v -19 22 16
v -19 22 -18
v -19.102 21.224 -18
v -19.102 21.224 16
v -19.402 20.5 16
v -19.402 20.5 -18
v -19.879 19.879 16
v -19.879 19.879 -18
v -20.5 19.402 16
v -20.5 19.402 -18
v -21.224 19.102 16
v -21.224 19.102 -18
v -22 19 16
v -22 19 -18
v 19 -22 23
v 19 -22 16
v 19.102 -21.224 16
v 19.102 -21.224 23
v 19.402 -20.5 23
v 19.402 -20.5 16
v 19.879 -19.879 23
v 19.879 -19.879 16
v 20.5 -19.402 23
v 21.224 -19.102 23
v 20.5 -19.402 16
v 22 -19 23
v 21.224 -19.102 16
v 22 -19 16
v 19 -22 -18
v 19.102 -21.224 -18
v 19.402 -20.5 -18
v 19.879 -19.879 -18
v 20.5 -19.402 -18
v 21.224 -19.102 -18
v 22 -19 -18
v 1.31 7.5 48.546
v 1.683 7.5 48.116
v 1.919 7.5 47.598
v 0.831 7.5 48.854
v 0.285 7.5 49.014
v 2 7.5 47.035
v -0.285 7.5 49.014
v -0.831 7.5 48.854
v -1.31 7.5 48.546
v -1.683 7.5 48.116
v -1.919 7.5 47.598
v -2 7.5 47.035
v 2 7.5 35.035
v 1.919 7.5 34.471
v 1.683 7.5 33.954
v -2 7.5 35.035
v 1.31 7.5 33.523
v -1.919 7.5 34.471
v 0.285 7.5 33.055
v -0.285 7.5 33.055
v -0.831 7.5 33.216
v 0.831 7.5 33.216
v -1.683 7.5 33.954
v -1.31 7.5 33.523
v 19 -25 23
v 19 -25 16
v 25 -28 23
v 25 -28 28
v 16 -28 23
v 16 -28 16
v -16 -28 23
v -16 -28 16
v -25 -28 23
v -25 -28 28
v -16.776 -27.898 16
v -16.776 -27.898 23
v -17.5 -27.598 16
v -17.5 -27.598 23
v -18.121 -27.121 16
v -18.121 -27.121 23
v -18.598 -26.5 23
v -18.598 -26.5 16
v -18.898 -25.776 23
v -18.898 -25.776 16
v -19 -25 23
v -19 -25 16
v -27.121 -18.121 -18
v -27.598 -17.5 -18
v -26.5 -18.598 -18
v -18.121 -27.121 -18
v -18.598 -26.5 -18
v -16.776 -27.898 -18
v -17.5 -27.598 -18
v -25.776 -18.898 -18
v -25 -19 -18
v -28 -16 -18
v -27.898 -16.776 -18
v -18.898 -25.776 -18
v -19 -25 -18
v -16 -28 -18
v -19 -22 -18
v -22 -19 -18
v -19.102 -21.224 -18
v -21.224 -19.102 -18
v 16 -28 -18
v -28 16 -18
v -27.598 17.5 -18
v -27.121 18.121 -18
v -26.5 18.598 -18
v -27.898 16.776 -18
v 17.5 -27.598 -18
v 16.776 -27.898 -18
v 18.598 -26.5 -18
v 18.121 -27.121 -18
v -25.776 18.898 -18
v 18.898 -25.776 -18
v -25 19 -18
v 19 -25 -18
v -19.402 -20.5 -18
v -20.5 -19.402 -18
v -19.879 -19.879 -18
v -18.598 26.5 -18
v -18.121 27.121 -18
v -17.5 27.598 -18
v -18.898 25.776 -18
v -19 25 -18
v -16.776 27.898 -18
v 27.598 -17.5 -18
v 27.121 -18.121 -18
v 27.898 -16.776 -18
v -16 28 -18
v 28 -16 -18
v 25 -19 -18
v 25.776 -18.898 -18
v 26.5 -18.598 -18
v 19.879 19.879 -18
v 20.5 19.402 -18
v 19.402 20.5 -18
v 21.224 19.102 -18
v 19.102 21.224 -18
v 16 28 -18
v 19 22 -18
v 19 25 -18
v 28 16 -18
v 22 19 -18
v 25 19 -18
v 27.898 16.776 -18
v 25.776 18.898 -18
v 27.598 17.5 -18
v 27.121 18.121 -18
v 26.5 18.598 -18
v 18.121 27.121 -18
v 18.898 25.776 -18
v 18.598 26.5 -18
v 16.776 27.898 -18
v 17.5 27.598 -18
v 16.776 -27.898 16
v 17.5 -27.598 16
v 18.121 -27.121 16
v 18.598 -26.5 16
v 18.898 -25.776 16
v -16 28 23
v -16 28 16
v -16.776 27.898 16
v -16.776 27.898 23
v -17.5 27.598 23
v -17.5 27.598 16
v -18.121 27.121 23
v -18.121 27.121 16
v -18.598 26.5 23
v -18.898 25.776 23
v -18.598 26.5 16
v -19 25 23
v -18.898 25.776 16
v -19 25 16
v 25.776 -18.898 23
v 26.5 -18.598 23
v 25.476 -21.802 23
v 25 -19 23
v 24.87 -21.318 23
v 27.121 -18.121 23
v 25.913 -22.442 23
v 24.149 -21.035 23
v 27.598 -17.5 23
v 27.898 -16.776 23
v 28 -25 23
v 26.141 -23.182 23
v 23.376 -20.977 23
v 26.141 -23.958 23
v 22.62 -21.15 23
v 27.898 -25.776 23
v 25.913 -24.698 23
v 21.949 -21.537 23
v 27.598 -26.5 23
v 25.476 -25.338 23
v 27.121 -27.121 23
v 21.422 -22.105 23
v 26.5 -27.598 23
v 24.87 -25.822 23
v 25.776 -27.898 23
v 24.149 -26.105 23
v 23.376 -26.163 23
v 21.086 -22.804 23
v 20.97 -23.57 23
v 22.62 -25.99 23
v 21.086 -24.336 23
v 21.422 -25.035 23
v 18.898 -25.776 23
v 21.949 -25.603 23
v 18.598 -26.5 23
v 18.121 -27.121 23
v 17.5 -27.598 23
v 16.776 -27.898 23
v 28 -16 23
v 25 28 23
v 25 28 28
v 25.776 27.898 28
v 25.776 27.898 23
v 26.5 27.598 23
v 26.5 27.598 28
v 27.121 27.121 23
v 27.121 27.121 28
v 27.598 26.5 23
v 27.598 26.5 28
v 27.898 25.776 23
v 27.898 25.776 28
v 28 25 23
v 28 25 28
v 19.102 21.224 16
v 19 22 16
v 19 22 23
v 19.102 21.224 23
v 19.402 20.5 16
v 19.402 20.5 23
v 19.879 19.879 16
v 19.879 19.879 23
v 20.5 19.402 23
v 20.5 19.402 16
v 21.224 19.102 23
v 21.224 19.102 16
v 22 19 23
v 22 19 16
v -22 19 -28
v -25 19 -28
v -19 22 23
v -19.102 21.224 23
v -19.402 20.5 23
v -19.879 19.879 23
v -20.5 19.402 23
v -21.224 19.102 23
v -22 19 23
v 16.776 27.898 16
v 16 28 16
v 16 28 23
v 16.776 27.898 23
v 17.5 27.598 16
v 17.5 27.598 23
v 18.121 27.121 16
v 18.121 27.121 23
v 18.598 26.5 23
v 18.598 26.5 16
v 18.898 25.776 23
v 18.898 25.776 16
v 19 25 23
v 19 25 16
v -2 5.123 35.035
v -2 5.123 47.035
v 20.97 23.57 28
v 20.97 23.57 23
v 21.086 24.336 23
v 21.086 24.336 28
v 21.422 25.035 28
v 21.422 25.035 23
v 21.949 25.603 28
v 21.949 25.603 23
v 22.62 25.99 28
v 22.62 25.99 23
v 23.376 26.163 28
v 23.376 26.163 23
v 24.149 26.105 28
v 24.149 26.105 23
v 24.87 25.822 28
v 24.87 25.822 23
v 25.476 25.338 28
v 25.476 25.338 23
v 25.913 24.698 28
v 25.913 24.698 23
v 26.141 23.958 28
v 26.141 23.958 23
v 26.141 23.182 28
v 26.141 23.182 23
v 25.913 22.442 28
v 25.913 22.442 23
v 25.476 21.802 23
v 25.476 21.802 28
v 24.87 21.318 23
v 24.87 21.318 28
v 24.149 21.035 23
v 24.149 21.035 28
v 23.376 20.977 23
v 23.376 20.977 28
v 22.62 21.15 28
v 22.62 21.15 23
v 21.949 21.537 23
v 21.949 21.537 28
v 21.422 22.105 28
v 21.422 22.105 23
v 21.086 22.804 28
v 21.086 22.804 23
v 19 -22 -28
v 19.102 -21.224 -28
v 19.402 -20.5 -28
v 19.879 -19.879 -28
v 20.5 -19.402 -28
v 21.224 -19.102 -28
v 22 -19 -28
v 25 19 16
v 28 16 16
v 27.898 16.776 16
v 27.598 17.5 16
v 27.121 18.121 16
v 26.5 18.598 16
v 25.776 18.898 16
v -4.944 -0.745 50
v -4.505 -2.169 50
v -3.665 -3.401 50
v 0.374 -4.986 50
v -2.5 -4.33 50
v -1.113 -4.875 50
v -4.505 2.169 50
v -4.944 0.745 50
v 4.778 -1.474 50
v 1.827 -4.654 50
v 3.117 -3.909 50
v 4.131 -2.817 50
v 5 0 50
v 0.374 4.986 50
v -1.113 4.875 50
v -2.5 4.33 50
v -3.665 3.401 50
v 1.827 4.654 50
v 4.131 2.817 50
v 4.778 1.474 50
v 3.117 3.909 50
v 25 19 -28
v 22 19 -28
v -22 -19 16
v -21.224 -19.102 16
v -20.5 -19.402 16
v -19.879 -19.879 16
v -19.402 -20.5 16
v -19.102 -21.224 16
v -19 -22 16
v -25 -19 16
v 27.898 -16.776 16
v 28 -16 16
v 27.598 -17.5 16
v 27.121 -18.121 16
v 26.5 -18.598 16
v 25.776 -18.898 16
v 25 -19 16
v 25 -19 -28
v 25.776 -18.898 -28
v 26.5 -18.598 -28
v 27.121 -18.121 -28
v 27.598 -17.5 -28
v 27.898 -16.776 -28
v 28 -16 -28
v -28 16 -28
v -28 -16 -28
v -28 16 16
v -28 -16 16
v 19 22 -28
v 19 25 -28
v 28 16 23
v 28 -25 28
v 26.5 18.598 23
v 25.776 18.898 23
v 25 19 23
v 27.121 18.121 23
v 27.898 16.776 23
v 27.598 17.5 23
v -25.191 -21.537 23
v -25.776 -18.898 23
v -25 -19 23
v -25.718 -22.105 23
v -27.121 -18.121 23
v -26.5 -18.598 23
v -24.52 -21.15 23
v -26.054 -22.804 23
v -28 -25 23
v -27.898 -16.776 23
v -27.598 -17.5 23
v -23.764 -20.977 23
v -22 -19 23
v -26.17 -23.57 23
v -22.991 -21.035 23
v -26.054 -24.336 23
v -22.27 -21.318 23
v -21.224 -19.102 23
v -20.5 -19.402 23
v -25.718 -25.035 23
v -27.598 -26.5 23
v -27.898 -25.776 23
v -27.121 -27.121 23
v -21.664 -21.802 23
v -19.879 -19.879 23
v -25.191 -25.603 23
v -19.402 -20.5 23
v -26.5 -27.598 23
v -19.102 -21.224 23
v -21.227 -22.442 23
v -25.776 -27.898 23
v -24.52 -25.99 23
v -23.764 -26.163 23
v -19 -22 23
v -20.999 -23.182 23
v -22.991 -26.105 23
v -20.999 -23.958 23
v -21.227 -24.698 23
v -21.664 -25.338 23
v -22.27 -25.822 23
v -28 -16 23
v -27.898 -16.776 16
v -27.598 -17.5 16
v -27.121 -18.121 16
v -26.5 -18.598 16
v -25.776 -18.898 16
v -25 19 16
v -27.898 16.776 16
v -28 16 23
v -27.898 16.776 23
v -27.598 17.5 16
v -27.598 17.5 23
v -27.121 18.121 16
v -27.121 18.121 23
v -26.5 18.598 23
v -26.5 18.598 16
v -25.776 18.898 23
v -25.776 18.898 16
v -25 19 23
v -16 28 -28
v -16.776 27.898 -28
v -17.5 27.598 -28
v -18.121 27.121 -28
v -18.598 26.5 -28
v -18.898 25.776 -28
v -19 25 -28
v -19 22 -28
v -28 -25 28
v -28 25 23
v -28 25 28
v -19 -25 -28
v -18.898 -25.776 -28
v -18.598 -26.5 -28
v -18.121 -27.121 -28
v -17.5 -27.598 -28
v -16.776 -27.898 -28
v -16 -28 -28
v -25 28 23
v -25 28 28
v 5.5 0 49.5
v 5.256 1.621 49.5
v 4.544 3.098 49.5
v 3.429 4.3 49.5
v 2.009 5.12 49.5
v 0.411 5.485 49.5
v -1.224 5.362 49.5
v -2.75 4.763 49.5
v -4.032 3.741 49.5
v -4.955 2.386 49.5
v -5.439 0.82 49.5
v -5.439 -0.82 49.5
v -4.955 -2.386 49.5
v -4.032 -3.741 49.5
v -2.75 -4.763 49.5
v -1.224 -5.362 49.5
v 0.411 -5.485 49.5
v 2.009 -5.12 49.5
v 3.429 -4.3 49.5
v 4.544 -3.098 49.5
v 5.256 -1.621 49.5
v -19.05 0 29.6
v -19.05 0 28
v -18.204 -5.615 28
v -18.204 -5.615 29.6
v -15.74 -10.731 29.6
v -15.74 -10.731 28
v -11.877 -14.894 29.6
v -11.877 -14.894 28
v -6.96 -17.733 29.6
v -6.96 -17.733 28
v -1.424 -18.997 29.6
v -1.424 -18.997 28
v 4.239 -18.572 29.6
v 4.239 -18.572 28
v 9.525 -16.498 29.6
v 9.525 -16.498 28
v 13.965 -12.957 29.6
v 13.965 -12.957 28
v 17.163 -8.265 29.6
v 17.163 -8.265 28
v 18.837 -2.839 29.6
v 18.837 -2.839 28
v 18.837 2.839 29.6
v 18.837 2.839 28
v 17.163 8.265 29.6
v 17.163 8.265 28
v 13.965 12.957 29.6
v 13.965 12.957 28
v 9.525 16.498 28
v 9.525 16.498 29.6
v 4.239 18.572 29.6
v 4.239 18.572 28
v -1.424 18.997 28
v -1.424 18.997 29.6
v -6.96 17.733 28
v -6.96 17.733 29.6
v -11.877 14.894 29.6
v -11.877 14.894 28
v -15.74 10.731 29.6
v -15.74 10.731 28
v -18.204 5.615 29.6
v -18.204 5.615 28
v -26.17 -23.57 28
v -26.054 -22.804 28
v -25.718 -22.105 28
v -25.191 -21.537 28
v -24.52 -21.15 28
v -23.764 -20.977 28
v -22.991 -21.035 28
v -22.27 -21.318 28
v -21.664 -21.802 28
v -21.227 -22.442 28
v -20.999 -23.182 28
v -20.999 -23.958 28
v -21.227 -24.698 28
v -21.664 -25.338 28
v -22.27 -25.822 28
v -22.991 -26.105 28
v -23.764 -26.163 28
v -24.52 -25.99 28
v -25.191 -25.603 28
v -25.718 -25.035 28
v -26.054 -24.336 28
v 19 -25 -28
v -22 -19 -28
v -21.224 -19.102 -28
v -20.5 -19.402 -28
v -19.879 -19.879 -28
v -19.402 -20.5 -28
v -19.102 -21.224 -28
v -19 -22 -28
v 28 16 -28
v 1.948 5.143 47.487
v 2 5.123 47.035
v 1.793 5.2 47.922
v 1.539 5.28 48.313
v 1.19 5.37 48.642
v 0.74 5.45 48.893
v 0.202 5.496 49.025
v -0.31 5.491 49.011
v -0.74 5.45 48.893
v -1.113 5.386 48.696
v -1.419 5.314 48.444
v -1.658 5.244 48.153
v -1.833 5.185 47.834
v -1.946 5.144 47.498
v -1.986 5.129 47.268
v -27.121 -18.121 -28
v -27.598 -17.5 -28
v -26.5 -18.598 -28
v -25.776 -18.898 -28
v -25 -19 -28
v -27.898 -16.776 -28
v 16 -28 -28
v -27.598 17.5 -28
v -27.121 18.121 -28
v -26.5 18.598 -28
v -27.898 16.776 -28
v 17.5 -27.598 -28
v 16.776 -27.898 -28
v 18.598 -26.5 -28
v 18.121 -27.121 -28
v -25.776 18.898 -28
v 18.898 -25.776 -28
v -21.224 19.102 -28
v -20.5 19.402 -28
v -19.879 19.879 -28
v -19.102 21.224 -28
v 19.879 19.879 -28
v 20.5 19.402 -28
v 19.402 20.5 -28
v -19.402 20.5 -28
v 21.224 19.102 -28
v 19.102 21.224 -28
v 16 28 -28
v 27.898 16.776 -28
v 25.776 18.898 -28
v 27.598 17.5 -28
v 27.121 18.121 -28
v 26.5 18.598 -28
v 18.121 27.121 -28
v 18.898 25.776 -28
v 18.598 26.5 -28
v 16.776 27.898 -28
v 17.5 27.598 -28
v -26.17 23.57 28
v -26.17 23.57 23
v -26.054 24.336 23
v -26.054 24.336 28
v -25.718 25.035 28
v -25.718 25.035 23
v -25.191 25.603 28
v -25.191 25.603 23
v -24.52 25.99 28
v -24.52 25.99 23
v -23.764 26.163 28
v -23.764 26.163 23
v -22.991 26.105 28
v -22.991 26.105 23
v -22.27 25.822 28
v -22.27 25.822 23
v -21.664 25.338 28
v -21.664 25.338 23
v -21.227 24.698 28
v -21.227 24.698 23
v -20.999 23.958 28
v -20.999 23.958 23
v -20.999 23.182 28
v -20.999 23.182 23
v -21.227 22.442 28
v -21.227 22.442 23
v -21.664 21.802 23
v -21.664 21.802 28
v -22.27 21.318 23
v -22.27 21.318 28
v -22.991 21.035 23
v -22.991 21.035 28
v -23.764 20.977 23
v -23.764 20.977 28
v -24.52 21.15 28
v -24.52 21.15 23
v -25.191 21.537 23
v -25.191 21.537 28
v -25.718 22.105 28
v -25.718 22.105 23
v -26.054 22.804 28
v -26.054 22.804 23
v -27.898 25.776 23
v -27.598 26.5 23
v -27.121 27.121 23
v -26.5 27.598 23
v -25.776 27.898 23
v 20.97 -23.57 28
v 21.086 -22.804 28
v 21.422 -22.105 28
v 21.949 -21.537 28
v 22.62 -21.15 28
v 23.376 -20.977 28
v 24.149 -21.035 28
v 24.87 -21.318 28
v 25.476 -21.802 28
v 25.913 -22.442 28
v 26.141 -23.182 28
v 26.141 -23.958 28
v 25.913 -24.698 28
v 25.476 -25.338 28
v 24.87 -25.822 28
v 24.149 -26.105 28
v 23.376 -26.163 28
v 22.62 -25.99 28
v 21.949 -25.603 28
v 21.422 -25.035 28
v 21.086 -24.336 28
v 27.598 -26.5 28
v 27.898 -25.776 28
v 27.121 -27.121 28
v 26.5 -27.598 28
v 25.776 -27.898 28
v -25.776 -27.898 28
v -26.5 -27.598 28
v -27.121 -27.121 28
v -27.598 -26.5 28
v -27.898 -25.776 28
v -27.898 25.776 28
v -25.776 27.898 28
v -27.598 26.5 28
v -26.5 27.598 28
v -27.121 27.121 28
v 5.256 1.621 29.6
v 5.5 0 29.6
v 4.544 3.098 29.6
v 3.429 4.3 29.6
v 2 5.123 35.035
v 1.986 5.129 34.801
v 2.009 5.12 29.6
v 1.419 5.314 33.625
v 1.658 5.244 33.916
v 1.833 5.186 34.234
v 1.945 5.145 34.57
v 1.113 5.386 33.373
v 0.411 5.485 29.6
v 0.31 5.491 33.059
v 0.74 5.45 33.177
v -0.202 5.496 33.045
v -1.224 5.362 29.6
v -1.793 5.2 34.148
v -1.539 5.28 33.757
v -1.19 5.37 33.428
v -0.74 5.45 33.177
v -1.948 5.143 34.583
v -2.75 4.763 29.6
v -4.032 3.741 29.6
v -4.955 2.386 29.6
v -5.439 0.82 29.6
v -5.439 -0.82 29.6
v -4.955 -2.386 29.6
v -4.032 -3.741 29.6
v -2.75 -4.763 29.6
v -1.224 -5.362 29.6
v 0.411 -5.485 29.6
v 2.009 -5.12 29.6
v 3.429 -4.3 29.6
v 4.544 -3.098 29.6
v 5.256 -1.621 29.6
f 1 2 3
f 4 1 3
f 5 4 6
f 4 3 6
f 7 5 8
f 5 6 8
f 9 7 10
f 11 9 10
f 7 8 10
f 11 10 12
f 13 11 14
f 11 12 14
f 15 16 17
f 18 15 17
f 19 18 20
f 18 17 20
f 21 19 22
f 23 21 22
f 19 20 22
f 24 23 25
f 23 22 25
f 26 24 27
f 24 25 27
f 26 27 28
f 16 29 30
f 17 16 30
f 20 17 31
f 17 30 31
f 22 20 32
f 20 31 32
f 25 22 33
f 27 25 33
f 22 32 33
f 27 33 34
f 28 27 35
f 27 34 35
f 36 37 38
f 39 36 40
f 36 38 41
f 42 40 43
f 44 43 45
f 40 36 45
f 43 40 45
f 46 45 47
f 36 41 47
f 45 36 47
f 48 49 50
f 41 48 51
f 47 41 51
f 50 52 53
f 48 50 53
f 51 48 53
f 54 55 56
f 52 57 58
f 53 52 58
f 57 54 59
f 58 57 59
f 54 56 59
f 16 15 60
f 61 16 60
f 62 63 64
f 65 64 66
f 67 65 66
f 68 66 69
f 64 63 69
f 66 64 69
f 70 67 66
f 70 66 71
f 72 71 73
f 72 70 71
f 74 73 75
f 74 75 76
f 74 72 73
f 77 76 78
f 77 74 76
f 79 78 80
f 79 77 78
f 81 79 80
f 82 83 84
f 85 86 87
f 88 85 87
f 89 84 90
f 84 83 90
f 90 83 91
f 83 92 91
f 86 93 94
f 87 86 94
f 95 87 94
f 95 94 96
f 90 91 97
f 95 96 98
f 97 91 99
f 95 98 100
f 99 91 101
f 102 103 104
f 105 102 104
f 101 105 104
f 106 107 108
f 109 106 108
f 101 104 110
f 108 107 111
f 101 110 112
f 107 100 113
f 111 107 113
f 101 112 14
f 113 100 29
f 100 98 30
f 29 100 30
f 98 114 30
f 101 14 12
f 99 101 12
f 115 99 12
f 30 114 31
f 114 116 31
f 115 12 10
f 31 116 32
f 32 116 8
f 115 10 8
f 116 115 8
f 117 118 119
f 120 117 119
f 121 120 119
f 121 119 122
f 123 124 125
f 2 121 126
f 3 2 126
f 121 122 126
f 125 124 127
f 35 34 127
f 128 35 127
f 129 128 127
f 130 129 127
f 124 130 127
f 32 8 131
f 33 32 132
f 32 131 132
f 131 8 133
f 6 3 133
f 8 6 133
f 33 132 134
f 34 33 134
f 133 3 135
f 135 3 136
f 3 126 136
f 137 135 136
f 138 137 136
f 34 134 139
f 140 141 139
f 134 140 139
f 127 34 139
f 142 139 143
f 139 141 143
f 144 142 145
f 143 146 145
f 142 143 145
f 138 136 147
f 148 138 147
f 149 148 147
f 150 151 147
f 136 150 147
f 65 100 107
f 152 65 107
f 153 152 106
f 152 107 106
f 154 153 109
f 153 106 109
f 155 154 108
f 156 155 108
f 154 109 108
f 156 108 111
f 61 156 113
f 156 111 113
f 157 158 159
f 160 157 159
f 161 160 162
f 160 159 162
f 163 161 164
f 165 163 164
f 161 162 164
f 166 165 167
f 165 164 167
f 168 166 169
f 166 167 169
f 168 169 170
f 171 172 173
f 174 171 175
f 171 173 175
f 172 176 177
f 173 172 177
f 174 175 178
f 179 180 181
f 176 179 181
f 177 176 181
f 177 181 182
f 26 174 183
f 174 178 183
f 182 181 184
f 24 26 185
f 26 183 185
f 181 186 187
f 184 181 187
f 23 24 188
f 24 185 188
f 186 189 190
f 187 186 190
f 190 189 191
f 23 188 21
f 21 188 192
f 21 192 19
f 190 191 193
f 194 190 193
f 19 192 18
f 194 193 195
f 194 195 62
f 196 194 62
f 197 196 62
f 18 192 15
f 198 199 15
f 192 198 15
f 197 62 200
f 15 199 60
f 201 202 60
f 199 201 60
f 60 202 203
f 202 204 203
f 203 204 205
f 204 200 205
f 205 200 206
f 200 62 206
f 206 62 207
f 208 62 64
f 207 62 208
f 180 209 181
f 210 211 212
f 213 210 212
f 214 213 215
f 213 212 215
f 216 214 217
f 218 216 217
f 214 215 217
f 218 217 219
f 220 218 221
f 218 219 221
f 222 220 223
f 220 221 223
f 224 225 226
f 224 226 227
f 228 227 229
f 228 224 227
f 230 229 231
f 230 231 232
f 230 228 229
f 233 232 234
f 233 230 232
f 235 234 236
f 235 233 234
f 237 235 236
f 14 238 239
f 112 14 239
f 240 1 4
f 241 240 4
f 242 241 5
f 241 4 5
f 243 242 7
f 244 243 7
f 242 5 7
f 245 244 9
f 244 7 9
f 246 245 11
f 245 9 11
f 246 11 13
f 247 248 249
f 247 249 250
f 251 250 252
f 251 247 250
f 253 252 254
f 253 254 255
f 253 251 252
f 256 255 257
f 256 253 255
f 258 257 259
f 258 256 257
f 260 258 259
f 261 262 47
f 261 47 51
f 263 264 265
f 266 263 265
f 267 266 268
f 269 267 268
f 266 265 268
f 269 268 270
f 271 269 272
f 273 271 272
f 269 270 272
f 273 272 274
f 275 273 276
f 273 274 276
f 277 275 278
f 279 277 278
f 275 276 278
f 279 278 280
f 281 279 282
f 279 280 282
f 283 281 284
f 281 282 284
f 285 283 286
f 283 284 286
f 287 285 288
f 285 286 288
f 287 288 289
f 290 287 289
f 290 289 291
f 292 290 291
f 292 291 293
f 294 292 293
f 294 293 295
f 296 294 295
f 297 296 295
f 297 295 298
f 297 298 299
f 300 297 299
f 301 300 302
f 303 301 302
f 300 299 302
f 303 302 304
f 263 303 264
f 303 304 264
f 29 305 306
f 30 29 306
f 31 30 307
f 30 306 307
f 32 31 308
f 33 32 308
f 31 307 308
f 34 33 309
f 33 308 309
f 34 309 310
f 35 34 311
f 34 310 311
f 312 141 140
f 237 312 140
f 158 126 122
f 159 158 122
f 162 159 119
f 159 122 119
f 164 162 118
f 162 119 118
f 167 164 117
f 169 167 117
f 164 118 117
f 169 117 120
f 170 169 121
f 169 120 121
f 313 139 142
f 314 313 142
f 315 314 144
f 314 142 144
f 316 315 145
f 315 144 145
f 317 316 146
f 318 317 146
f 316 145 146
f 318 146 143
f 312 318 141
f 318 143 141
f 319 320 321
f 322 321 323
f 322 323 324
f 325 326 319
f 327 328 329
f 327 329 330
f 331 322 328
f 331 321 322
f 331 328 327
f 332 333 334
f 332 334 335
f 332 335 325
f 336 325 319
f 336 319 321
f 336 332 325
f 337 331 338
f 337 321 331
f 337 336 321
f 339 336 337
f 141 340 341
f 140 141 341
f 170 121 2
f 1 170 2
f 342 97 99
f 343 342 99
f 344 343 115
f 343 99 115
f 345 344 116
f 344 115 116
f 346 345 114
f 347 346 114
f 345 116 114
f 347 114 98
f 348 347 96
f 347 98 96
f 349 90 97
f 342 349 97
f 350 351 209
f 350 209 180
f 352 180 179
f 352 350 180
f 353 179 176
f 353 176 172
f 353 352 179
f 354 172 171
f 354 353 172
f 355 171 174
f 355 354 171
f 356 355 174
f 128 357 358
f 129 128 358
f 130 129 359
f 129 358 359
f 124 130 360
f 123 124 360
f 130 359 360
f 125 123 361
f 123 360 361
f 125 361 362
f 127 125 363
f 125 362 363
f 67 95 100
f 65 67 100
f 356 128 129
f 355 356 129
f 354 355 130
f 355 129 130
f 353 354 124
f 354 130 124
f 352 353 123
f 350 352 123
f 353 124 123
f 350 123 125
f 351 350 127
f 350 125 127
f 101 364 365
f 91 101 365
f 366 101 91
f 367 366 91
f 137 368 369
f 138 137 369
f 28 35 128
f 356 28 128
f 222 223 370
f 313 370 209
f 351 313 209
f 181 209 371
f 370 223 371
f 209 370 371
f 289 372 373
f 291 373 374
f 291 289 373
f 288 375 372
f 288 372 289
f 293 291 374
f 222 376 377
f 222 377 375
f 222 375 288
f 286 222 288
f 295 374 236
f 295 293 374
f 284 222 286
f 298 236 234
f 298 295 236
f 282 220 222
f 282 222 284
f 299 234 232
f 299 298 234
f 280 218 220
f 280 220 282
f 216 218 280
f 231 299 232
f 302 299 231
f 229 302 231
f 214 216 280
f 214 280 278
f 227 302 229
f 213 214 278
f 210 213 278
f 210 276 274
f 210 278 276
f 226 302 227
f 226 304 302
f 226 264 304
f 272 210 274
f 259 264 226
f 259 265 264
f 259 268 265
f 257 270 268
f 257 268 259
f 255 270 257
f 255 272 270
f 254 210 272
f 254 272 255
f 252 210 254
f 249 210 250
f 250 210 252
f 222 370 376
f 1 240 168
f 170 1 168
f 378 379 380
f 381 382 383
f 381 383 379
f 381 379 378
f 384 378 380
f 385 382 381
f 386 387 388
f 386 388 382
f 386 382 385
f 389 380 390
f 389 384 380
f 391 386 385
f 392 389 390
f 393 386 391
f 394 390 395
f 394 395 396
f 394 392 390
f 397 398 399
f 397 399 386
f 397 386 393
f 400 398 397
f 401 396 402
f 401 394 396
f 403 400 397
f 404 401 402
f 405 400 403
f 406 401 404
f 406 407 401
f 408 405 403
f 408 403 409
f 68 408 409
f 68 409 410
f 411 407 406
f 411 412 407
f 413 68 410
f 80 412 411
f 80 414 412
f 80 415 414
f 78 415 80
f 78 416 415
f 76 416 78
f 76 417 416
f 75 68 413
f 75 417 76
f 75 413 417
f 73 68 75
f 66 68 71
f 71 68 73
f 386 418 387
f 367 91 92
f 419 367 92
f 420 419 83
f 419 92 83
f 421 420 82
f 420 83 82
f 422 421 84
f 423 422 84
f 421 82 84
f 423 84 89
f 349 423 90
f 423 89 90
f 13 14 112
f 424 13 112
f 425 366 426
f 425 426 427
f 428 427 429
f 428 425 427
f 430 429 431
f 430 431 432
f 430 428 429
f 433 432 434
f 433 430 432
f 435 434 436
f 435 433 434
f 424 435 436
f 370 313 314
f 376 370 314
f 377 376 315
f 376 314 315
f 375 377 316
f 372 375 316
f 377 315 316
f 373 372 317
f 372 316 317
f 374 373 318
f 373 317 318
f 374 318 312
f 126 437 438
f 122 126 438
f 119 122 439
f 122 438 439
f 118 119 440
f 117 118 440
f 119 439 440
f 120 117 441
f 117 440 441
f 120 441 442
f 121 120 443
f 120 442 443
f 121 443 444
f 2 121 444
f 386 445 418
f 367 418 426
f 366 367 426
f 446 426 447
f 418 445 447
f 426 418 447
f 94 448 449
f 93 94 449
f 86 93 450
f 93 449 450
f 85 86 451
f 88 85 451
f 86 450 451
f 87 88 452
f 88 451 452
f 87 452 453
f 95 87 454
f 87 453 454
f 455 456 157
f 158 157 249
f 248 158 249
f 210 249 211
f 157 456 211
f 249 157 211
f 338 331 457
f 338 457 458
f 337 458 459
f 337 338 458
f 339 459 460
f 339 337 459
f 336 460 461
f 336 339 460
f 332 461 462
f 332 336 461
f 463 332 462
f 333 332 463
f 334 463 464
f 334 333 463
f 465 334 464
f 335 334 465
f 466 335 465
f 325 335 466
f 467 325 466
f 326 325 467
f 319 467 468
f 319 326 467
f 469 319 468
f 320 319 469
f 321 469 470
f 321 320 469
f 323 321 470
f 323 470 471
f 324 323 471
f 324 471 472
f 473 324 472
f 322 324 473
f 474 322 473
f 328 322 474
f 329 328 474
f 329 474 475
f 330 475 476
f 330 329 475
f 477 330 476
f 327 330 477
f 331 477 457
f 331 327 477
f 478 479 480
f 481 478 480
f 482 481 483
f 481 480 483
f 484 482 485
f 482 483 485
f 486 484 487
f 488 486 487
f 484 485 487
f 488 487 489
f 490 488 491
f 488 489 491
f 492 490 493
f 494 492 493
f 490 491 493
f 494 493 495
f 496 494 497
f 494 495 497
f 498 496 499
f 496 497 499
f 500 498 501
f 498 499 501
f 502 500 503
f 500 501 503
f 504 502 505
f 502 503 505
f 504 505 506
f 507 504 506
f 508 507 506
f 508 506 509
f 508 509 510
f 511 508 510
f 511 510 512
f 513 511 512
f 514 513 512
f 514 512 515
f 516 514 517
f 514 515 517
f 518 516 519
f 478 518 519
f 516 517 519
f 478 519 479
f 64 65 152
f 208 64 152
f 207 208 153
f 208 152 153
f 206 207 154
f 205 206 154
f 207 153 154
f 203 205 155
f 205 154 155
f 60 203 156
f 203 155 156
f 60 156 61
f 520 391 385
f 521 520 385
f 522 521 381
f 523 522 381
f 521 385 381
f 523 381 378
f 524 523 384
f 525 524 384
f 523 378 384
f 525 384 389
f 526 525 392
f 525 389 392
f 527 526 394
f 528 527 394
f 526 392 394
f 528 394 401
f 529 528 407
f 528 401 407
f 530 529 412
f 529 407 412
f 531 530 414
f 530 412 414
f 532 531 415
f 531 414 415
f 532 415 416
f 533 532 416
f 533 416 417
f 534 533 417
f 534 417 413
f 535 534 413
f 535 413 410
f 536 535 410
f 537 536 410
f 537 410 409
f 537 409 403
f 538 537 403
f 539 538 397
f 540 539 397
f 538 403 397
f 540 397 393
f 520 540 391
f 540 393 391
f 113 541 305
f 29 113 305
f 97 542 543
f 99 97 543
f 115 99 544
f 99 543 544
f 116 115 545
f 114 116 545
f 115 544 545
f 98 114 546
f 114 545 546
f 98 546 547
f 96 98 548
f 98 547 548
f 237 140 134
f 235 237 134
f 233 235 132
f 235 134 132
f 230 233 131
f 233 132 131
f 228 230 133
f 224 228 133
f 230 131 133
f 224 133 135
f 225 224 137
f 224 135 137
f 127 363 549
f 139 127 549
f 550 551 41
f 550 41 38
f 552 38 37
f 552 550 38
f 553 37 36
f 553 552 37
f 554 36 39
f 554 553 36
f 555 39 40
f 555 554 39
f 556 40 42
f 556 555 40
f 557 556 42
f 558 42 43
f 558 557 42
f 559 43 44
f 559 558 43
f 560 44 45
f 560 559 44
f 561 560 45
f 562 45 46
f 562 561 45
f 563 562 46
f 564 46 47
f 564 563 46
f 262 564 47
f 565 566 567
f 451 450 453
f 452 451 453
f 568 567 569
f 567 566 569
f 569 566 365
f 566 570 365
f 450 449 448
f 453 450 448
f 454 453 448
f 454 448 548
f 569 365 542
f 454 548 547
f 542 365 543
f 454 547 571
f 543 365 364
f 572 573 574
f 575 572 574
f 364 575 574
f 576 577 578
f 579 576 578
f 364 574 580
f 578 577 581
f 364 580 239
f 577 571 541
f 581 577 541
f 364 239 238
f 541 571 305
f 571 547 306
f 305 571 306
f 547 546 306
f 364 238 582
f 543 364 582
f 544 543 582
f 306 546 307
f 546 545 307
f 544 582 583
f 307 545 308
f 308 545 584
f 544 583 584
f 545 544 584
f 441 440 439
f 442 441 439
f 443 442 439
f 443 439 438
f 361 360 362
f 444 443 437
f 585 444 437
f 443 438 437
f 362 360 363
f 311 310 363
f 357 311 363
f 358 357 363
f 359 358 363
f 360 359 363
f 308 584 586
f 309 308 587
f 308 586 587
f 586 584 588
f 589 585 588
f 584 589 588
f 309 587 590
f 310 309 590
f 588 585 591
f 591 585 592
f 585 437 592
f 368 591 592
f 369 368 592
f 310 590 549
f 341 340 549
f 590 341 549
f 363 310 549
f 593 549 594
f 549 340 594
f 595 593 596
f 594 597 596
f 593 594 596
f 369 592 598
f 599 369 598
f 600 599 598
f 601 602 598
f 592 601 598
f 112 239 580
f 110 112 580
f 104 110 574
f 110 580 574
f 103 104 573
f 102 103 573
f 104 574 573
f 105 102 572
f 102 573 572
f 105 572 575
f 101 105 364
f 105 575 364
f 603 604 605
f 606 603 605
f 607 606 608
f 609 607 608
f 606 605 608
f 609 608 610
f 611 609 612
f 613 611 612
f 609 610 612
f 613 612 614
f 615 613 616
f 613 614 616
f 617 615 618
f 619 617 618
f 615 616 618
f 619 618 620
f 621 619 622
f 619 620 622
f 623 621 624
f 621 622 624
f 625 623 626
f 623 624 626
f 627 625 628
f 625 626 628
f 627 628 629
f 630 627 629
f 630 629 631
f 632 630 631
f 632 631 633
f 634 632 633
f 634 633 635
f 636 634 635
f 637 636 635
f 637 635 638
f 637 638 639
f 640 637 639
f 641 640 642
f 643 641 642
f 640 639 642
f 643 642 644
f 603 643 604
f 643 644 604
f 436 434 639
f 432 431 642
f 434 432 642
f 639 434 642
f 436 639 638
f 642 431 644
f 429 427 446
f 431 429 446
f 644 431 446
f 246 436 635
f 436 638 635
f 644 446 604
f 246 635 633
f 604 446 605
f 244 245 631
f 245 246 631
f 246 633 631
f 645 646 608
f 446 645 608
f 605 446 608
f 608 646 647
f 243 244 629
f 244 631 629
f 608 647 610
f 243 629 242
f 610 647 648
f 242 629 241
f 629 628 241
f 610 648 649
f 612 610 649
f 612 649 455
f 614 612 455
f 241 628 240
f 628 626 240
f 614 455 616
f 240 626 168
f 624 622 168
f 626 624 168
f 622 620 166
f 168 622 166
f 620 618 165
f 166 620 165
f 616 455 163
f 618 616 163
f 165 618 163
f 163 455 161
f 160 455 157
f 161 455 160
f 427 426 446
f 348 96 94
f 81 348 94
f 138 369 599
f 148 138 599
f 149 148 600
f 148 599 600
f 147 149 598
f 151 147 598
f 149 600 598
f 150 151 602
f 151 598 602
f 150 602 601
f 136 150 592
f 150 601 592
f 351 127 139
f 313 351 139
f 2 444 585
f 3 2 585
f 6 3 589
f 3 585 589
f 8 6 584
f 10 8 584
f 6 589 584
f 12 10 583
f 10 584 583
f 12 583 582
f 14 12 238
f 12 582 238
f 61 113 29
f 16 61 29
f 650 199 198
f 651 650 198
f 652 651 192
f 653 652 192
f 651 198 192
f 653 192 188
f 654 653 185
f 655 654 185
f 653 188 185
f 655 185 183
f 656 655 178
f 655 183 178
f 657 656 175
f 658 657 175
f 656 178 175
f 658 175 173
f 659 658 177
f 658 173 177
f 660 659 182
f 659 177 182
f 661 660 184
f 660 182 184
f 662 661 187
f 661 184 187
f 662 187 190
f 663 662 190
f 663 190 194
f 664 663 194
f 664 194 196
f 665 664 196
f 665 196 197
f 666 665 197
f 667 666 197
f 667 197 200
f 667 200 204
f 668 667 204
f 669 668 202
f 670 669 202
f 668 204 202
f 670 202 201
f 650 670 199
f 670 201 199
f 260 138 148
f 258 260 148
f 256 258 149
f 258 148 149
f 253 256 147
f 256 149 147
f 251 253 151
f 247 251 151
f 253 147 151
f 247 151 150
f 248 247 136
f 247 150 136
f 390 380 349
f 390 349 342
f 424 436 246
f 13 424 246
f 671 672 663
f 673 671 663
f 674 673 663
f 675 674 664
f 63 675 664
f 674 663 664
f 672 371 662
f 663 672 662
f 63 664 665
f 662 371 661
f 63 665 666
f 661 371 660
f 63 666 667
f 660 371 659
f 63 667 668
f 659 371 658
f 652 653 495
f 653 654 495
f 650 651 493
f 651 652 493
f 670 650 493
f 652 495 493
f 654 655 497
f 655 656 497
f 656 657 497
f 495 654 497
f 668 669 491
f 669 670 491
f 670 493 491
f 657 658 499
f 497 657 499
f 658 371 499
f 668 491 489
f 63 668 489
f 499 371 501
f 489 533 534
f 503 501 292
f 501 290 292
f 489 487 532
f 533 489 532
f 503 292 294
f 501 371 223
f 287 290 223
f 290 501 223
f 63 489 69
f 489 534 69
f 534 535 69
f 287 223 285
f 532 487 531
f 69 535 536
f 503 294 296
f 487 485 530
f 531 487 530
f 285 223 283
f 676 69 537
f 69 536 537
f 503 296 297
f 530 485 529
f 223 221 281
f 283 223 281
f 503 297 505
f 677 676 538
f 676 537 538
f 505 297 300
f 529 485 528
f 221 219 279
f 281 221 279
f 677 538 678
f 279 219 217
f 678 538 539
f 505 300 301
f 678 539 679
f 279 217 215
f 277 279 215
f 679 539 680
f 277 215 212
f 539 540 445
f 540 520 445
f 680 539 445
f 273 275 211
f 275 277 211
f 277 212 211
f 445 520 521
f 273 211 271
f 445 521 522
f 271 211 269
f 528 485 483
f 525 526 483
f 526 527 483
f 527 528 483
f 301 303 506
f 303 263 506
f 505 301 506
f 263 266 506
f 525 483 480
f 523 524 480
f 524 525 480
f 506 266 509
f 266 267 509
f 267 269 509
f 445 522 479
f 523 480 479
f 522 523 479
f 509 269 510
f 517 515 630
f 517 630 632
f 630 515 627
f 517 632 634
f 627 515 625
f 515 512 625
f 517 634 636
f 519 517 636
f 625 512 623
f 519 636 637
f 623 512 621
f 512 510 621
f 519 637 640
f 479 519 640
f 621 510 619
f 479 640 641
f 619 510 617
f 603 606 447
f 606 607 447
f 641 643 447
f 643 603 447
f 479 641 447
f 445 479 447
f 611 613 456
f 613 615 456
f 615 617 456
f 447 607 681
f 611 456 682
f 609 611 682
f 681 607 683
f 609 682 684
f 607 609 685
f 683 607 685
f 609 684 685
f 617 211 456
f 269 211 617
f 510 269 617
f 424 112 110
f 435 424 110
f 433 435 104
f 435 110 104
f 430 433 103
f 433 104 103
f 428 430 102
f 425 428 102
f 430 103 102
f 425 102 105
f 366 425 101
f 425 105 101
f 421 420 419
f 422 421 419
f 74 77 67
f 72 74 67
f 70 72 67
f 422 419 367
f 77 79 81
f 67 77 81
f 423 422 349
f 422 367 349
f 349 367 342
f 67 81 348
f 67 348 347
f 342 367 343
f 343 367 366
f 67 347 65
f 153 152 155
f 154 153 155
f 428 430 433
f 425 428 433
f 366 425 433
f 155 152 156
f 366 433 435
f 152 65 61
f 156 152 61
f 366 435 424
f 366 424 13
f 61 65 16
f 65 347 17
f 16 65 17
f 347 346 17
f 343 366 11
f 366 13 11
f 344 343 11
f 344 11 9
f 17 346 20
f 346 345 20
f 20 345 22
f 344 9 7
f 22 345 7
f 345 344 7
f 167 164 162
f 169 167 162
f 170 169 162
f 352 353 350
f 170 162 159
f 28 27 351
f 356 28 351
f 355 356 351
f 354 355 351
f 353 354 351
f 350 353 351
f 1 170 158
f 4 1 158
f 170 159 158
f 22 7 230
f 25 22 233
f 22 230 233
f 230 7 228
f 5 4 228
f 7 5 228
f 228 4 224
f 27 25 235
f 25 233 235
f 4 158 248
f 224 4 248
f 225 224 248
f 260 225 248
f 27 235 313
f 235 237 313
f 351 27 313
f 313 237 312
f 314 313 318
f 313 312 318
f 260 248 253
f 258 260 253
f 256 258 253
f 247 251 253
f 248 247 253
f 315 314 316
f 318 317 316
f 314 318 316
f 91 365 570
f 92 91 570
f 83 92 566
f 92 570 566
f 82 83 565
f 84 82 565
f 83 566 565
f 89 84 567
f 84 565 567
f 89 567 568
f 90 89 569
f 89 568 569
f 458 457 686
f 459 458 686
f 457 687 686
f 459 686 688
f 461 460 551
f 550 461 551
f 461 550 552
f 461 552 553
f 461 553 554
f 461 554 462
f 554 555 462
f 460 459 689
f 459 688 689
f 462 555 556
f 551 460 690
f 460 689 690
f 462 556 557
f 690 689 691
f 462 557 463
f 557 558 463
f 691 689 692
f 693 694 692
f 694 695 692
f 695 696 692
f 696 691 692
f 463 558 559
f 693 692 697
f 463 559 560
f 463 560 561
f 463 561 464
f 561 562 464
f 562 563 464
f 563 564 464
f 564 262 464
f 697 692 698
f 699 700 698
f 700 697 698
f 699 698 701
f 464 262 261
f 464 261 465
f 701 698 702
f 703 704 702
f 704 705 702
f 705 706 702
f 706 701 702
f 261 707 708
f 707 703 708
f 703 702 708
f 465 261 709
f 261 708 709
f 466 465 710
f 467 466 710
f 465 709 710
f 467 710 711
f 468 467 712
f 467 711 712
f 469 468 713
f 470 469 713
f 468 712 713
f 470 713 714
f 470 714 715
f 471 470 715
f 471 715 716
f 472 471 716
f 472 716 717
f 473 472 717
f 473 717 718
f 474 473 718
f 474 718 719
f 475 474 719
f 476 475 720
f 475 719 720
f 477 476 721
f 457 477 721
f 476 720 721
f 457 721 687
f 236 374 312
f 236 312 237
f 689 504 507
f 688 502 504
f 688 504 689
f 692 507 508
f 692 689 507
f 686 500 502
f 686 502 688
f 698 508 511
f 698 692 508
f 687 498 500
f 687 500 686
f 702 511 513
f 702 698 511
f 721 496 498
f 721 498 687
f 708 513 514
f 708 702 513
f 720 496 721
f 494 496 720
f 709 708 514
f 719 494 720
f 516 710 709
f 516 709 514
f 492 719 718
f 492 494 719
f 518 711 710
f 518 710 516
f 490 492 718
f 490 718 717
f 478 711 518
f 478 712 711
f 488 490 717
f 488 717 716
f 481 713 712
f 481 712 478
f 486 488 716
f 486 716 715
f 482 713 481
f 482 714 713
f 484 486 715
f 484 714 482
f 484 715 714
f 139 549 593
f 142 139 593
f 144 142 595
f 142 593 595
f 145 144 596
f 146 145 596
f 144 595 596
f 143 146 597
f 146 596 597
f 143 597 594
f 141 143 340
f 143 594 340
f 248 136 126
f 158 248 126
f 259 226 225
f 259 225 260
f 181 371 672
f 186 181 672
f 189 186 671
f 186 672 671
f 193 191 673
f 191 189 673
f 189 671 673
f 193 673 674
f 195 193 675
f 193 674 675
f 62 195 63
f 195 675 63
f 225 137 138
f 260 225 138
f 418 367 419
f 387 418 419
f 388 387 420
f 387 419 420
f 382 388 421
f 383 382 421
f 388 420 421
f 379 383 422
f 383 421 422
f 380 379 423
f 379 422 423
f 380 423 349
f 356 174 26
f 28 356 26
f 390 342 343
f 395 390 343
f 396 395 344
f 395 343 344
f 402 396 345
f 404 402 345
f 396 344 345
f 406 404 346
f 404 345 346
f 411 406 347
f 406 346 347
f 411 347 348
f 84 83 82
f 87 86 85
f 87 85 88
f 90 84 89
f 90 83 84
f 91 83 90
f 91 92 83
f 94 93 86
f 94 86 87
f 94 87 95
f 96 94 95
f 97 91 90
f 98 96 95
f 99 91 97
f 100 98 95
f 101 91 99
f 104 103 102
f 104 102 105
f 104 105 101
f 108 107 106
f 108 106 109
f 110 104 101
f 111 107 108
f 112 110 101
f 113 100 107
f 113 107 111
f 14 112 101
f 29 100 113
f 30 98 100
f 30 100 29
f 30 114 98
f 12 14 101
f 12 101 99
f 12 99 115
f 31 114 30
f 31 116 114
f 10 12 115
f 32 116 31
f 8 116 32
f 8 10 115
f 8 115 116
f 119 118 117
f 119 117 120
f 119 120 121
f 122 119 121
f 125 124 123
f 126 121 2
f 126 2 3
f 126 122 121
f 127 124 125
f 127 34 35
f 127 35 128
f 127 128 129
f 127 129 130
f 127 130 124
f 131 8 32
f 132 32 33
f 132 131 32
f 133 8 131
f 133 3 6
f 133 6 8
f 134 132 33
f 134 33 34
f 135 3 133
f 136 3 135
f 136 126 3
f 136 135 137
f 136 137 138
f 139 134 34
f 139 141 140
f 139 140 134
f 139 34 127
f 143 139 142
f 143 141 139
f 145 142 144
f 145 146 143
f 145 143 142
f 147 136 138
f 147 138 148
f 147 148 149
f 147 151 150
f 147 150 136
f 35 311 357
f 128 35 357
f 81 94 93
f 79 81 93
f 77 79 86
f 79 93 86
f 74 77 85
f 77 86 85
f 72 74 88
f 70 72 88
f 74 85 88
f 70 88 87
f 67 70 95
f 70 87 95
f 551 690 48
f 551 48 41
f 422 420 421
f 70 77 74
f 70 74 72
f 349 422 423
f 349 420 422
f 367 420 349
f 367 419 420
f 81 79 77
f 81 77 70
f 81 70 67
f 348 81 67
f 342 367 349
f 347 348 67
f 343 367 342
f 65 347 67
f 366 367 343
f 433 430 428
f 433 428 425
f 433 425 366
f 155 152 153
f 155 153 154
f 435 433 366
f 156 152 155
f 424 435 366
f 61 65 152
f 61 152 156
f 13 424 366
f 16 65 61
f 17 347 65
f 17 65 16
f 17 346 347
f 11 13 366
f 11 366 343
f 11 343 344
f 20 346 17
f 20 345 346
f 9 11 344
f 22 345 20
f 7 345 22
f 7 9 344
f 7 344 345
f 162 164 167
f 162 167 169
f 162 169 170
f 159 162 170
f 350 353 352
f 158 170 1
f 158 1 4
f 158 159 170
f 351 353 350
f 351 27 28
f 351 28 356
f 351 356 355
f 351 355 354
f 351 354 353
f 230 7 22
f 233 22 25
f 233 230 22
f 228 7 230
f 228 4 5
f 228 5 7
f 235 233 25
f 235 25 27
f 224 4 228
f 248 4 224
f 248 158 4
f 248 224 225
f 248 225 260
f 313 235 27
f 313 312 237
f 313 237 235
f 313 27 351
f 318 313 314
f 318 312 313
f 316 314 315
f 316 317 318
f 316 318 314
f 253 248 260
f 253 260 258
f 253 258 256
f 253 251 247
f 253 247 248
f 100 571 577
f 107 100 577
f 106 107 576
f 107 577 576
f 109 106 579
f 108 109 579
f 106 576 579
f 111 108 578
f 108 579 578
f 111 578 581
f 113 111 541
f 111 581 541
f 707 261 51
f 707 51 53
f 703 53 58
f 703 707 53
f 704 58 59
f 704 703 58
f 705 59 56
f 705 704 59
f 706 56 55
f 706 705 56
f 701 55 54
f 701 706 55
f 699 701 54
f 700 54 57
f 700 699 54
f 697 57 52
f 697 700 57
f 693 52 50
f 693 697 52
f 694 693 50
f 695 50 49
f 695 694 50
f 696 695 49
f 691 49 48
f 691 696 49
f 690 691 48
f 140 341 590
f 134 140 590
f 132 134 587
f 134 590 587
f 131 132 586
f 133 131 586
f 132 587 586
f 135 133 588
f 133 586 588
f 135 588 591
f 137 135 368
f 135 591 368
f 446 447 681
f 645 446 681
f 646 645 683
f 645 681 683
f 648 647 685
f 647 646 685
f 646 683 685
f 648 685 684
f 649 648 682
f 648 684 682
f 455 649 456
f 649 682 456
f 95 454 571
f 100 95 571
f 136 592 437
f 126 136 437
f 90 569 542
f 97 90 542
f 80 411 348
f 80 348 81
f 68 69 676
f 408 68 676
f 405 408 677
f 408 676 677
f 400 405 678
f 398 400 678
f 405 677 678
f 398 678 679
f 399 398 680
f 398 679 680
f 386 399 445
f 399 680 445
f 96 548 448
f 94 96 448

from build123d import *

# Parameters (mm, degrees)
SALIENTE_EXTRUIR1_DEPTH                      = 28
PERFORADOR_PARA_ROSCAR_HELICOIL_DE_M51_D     = 5.2
PERFORADOR_PARA_ROSCAR_HELICOIL_DE_M51_DEPTH = 9
PERFORADOR_PARA_ROSCAR_HELICOIL_DE_M51_TIP   = 1.562237609
CORTAR_EXTRUIR1_START                        = -51
CORTAR_EXTRUIR1_DEPTH                        = 51
SIMETR_A4_START                              = -51
SIMETR_A4_COPY_1_DEPTH                       = 51
SIMETR_A4_COPY_2_DEPTH                       = 51
REDONDEO1_R                                  = 3
CROQUIS6_R                                   = 19.05
SALIENTE_EXTRUIR2_DEPTH                      = 1.6
CROQUIS7_R                                   = 5.5
SALIENTE_EXTRUIR3_DEPTH                      = 20.4
CHAFL_N1_SIZE                                = 0.5
SALIENTE_EXTRUIR4_DEPTH                      = 2
SALIENTE_EXTRUIR4_DEPTH_BACK                 = 2
PARTIR1_START                                = -28
PARTIR1_DEPTH                                = 10
PARTIR1_2_DEPTH                              = 44
PARTIR1_START_2                              = -18
PARTIR1_3_DEPTH                              = 34


# Read off the part's stored shape, not the designer's step: Partir1
with BuildPart() as part:
    # Croquis1 → Saliente-Extruir1 (new, symmetric)
    with BuildSketch(Plane.XY):
        with BuildLine():
            Line((-25, 28), (25, 28))
            ThreePointArc((25, 28), (27.121320344, 27.121320344), (28, 25))
            Line((28, 25), (28, -25))
            ThreePointArc((28, -25), (27.121320344, -27.121320344), (25, -28))
            Line((25, -28), (-25, -28))
            ThreePointArc((-25, -28), (-27.121320344, -27.121320344), (-28, -25))
            Line((-28, -25), (-28, 25))
            ThreePointArc((-28, 25), (-27.121320344, 27.121320344), (-25, 28))
        make_face()
    extrude(amount=SALIENTE_EXTRUIR1_DEPTH, both=True)

    # Perforador para roscar Helicoil de M51
    with Locations(Plane(origin=(-23.57, 23.57, 28), x_dir=(1, 0, 0), z_dir=(0, 0, 1))):
        with Locations((0, 0), (47.14, 0), (47.14, -47.14), (0, -47.14)):
            Hole(PERFORADOR_PARA_ROSCAR_HELICOIL_DE_M51_D / 2, depth=PERFORADOR_PARA_ROSCAR_HELICOIL_DE_M51_DEPTH)
            with Locations((0, 0, -(PERFORADOR_PARA_ROSCAR_HELICOIL_DE_M51_DEPTH + PERFORADOR_PARA_ROSCAR_HELICOIL_DE_M51_TIP / 2))):  # 118° drill point
                Cone(0, PERFORADOR_PARA_ROSCAR_HELICOIL_DE_M51_D / 2, PERFORADOR_PARA_ROSCAR_HELICOIL_DE_M51_TIP, mode=Mode.SUBTRACT)

    # Croquis5 → Cortar-Extruir1 (cut)
    with BuildSketch(Plane(origin=(0, 0, -28), x_dir=(-1, 0, 0), z_dir=(0, 0, -1)).offset(CORTAR_EXTRUIR1_START)):
        with BuildLine():
            Line((-28, 25), (-28, 19))
            Line((-28, 19), (-19, 19))
            Line((-19, 19), (-19, 28))
            Line((-19, 28), (-25, 28))
            ThreePointArc((-25, 28), (-27.121320344, 27.121320344), (-28, 25))
        make_face()
    cortar_extruir1 = extrude(amount=CORTAR_EXTRUIR1_DEPTH, mode=Mode.SUBTRACT)

    # Simetría1: Cortar-Extruir1 across plane
    add(cortar_extruir1.mirror(Plane(origin=(0, 0, 0), x_dir=(0, 0, 1), z_dir=(1, 0, 0))), mode=Mode.SUBTRACT)

    # Simetría3: Cortar-Extruir1 across plane
    add(cortar_extruir1.mirror(Plane.ZX), mode=Mode.SUBTRACT)

    # Simetría4 copy 1 sketch → Simetría4 copy 1 (cut)
    with BuildSketch(Plane(origin=(0, 0, -28), x_dir=(1, 0, 0), z_dir=(0, 0, -1)).offset(SIMETR_A4_START)):
        with BuildLine():
            Line((-28, 25), (-28, 19))
            Line((-28, 19), (-19, 19))
            Line((-19, 19), (-19, 28))
            Line((-19, 28), (-25, 28))
            ThreePointArc((-25, 28), (-27.121320344, 27.121320344), (-28, 25))
        make_face()
    extrude(amount=SIMETR_A4_COPY_1_DEPTH, mode=Mode.SUBTRACT)

    # Simetría4 copy 2 sketch → Simetría4 copy 2 (cut)
    with BuildSketch(Plane(origin=(0, 0, -28), x_dir=(1, 0, 0), z_dir=(0, 0, -1)).offset(SIMETR_A4_START)):
        with BuildLine():
            Line((-28, -25), (-28, -19))
            Line((-28, -19), (-19, -19))
            Line((-19, -19), (-19, -28))
            Line((-19, -28), (-25, -28))
            ThreePointArc((-25, -28), (-27.121320344, -27.121320344), (-28, -25))
        make_face()
    extrude(amount=SIMETR_A4_COPY_2_DEPTH, mode=Mode.SUBTRACT)

    # Redondeo1
    redondeo1_edges = [part.edges().sort_by_distance(p)[0] for p in [
        (-19, -19, -2.5),
        (-28, -19, -2.5),
        (-19, -28, -2.5),
        (19, 19, -2.5),
        (28, 19, -2.5),
        (19, 28, -2.5),
        (-28, 19, -2.5),
        (-19, 19, -2.5),
        (-19, 28, -2.5),
        (28, -19, -2.5),
        (19, -19, -2.5),
        (19, -28, -2.5),
    ]]
    fillet(redondeo1_edges, radius=REDONDEO1_R)

    # Croquis6 → Saliente-Extruir2 (add)
    with BuildSketch(Plane.XY.offset(28)):
        with Locations(Location((0, 0, 0), (0, 0, 180))):
            Circle(CROQUIS6_R)
    extrude(amount=SALIENTE_EXTRUIR2_DEPTH)

    # Croquis7 → Saliente-Extruir3 (add)
    with BuildSketch(Plane.XY.offset(29.6)):
        Circle(CROQUIS7_R)
    extrude(amount=SALIENTE_EXTRUIR3_DEPTH)

    # Chaflán1
    chafl_n1_edges = [part.edges().sort_by_distance(p)[0] for p in [
        (-5.5, 0, 50),
    ]]
    chamfer(chafl_n1_edges, length=CHAFL_N1_SIZE)

    # Croquis8 → Saliente-Extruir4 (add, two sides: drawn at the far end of the back side and taken through both)
    with BuildSketch(Plane(origin=(0, 5.5, 0), x_dir=(1, 0, 0), z_dir=(0, 1, 0)).offset(-SALIENTE_EXTRUIR4_DEPTH_BACK)):
        with BuildLine():
            Line((-2, -47.034811322), (-2, -35.034811322))
            ThreePointArc((-2, -35.034811322), (0, -33.034811322), (2, -35.034811322))
            Line((2, -35.034811322), (2, -47.034811322))
            ThreePointArc((2, -47.034811322), (0, -49.034811322), (-2, -47.034811322))
        make_face()
    extrude(amount=SALIENTE_EXTRUIR4_DEPTH + SALIENTE_EXTRUIR4_DEPTH_BACK)

    # Partir1 2 outline → Partir1 2 (cut)
    with BuildSketch(Plane.XY.offset(PARTIR1_START)):
        with BuildLine():
            Line((-16, -28), (16, -28))
            ThreePointArc((16, -28), (18.121320344, -27.121320344), (19, -25))
            Line((19, -25), (19, -22))
            ThreePointArc((19, -22), (19.878679656, -19.878679656), (22, -19))
            Line((22, -19), (25, -19))
            ThreePointArc((25, -19), (27.121320344, -18.121320344), (28, -16))
            Line((28, -16), (28, 16))
            ThreePointArc((28, 16), (27.121320344, 18.121320344), (25, 19))
            Line((25, 19), (22, 19))
            ThreePointArc((22, 19), (19.878679656, 19.878679656), (19, 22))
            Line((19, 22), (19, 25))
            ThreePointArc((19, 25), (18.121320344, 27.121320344), (16, 28))
            Line((16, 28), (-16, 28))
            ThreePointArc((-16, 28), (-18.121320344, 27.121320344), (-19, 25))
            Line((-19, 25), (-19, 22))
            ThreePointArc((-19, 22), (-19.878679656, 19.878679656), (-22, 19))
            Line((-22, 19), (-25, 19))
            ThreePointArc((-25, 19), (-27.121320344, 18.121320344), (-28, 16))
            Line((-28, 16), (-28, -16))
            ThreePointArc((-28, -16), (-27.121320344, -18.121320344), (-25, -19))
            Line((-25, -19), (-22, -19))
            ThreePointArc((-22, -19), (-19.878679656, -19.878679656), (-19, -22))
            Line((-19, -22), (-19, -25))
            ThreePointArc((-19, -25), (-18.121320344, -27.121320344), (-16, -28))
        make_face()
    extrude(amount=PARTIR1_2_DEPTH, mode=Mode.SUBTRACT)


with BuildPart() as body_2:
    # Partir1 outline → Partir1 (new body)
    with BuildSketch(Plane.XY.offset(PARTIR1_START)):
        with BuildLine():
            Line((-19, -22), (-19, -25))
            ThreePointArc((-19, -25), (-18.121320344, -27.121320344), (-16, -28))
            Line((-16, -28), (16, -28))
            ThreePointArc((16, -28), (18.121320344, -27.121320344), (19, -25))
            Line((19, -25), (19, -22))
            ThreePointArc((19, -22), (19.878679656, -19.878679656), (22, -19))
            Line((22, -19), (25, -19))
            ThreePointArc((25, -19), (27.121320344, -18.121320344), (28, -16))
            Line((28, -16), (28, 16))
            ThreePointArc((28, 16), (27.121320344, 18.121320344), (25, 19))
            Line((25, 19), (22, 19))
            ThreePointArc((22, 19), (19.878679656, 19.878679656), (19, 22))
            Line((19, 22), (19, 25))
            ThreePointArc((19, 25), (18.121320344, 27.121320344), (16, 28))
            Line((16, 28), (-16, 28))
            ThreePointArc((-16, 28), (-18.121320344, 27.121320344), (-19, 25))
            Line((-19, 25), (-19, 22))
            ThreePointArc((-19, 22), (-19.878679656, 19.878679656), (-22, 19))
            Line((-22, 19), (-25, 19))
            ThreePointArc((-25, 19), (-27.121320344, 18.121320344), (-28, 16))
            Line((-28, 16), (-28, -16))
            ThreePointArc((-28, -16), (-27.121320344, -18.121320344), (-25, -19))
            Line((-25, -19), (-22, -19))
            ThreePointArc((-22, -19), (-19.878679656, -19.878679656), (-19, -22))
        make_face()
    extrude(amount=PARTIR1_DEPTH)


with BuildPart() as body_3:
    # Partir1 3 outline → Partir1 3 (new body)
    with BuildSketch(Plane.XY.offset(PARTIR1_START_2)):
        with BuildLine():
            Line((-19, -22), (-19, -25))
            ThreePointArc((-19, -25), (-18.121320344, -27.121320344), (-16, -28))
            Line((-16, -28), (16, -28))
            ThreePointArc((16, -28), (18.121320344, -27.121320344), (19, -25))
            Line((19, -25), (19, -22))
            ThreePointArc((19, -22), (19.878679656, -19.878679656), (22, -19))
            Line((22, -19), (25, -19))
            ThreePointArc((25, -19), (27.121320344, -18.121320344), (28, -16))
            Line((28, -16), (28, 16))
            ThreePointArc((28, 16), (27.121320344, 18.121320344), (25, 19))
            Line((25, 19), (22, 19))
            ThreePointArc((22, 19), (19.878679656, 19.878679656), (19, 22))
            Line((19, 22), (19, 25))
            ThreePointArc((19, 25), (18.121320344, 27.121320344), (16, 28))
            Line((16, 28), (-16, 28))
            ThreePointArc((-16, 28), (-18.121320344, 27.121320344), (-19, 25))
            Line((-19, 25), (-19, 22))
            ThreePointArc((-19, 22), (-19.878679656, 19.878679656), (-22, 19))
            Line((-22, 19), (-25, 19))
            ThreePointArc((-25, 19), (-27.121320344, 18.121320344), (-28, 16))
            Line((-28, 16), (-28, -16))
            ThreePointArc((-28, -16), (-27.121320344, -18.121320344), (-25, -19))
            Line((-25, -19), (-22, -19))
            ThreePointArc((-22, -19), (-19.878679656, -19.878679656), (-19, -22))
        make_face()
    extrude(amount=PARTIR1_3_DEPTH)


solid = Compound([part.part, body_2.part, body_3.part])
